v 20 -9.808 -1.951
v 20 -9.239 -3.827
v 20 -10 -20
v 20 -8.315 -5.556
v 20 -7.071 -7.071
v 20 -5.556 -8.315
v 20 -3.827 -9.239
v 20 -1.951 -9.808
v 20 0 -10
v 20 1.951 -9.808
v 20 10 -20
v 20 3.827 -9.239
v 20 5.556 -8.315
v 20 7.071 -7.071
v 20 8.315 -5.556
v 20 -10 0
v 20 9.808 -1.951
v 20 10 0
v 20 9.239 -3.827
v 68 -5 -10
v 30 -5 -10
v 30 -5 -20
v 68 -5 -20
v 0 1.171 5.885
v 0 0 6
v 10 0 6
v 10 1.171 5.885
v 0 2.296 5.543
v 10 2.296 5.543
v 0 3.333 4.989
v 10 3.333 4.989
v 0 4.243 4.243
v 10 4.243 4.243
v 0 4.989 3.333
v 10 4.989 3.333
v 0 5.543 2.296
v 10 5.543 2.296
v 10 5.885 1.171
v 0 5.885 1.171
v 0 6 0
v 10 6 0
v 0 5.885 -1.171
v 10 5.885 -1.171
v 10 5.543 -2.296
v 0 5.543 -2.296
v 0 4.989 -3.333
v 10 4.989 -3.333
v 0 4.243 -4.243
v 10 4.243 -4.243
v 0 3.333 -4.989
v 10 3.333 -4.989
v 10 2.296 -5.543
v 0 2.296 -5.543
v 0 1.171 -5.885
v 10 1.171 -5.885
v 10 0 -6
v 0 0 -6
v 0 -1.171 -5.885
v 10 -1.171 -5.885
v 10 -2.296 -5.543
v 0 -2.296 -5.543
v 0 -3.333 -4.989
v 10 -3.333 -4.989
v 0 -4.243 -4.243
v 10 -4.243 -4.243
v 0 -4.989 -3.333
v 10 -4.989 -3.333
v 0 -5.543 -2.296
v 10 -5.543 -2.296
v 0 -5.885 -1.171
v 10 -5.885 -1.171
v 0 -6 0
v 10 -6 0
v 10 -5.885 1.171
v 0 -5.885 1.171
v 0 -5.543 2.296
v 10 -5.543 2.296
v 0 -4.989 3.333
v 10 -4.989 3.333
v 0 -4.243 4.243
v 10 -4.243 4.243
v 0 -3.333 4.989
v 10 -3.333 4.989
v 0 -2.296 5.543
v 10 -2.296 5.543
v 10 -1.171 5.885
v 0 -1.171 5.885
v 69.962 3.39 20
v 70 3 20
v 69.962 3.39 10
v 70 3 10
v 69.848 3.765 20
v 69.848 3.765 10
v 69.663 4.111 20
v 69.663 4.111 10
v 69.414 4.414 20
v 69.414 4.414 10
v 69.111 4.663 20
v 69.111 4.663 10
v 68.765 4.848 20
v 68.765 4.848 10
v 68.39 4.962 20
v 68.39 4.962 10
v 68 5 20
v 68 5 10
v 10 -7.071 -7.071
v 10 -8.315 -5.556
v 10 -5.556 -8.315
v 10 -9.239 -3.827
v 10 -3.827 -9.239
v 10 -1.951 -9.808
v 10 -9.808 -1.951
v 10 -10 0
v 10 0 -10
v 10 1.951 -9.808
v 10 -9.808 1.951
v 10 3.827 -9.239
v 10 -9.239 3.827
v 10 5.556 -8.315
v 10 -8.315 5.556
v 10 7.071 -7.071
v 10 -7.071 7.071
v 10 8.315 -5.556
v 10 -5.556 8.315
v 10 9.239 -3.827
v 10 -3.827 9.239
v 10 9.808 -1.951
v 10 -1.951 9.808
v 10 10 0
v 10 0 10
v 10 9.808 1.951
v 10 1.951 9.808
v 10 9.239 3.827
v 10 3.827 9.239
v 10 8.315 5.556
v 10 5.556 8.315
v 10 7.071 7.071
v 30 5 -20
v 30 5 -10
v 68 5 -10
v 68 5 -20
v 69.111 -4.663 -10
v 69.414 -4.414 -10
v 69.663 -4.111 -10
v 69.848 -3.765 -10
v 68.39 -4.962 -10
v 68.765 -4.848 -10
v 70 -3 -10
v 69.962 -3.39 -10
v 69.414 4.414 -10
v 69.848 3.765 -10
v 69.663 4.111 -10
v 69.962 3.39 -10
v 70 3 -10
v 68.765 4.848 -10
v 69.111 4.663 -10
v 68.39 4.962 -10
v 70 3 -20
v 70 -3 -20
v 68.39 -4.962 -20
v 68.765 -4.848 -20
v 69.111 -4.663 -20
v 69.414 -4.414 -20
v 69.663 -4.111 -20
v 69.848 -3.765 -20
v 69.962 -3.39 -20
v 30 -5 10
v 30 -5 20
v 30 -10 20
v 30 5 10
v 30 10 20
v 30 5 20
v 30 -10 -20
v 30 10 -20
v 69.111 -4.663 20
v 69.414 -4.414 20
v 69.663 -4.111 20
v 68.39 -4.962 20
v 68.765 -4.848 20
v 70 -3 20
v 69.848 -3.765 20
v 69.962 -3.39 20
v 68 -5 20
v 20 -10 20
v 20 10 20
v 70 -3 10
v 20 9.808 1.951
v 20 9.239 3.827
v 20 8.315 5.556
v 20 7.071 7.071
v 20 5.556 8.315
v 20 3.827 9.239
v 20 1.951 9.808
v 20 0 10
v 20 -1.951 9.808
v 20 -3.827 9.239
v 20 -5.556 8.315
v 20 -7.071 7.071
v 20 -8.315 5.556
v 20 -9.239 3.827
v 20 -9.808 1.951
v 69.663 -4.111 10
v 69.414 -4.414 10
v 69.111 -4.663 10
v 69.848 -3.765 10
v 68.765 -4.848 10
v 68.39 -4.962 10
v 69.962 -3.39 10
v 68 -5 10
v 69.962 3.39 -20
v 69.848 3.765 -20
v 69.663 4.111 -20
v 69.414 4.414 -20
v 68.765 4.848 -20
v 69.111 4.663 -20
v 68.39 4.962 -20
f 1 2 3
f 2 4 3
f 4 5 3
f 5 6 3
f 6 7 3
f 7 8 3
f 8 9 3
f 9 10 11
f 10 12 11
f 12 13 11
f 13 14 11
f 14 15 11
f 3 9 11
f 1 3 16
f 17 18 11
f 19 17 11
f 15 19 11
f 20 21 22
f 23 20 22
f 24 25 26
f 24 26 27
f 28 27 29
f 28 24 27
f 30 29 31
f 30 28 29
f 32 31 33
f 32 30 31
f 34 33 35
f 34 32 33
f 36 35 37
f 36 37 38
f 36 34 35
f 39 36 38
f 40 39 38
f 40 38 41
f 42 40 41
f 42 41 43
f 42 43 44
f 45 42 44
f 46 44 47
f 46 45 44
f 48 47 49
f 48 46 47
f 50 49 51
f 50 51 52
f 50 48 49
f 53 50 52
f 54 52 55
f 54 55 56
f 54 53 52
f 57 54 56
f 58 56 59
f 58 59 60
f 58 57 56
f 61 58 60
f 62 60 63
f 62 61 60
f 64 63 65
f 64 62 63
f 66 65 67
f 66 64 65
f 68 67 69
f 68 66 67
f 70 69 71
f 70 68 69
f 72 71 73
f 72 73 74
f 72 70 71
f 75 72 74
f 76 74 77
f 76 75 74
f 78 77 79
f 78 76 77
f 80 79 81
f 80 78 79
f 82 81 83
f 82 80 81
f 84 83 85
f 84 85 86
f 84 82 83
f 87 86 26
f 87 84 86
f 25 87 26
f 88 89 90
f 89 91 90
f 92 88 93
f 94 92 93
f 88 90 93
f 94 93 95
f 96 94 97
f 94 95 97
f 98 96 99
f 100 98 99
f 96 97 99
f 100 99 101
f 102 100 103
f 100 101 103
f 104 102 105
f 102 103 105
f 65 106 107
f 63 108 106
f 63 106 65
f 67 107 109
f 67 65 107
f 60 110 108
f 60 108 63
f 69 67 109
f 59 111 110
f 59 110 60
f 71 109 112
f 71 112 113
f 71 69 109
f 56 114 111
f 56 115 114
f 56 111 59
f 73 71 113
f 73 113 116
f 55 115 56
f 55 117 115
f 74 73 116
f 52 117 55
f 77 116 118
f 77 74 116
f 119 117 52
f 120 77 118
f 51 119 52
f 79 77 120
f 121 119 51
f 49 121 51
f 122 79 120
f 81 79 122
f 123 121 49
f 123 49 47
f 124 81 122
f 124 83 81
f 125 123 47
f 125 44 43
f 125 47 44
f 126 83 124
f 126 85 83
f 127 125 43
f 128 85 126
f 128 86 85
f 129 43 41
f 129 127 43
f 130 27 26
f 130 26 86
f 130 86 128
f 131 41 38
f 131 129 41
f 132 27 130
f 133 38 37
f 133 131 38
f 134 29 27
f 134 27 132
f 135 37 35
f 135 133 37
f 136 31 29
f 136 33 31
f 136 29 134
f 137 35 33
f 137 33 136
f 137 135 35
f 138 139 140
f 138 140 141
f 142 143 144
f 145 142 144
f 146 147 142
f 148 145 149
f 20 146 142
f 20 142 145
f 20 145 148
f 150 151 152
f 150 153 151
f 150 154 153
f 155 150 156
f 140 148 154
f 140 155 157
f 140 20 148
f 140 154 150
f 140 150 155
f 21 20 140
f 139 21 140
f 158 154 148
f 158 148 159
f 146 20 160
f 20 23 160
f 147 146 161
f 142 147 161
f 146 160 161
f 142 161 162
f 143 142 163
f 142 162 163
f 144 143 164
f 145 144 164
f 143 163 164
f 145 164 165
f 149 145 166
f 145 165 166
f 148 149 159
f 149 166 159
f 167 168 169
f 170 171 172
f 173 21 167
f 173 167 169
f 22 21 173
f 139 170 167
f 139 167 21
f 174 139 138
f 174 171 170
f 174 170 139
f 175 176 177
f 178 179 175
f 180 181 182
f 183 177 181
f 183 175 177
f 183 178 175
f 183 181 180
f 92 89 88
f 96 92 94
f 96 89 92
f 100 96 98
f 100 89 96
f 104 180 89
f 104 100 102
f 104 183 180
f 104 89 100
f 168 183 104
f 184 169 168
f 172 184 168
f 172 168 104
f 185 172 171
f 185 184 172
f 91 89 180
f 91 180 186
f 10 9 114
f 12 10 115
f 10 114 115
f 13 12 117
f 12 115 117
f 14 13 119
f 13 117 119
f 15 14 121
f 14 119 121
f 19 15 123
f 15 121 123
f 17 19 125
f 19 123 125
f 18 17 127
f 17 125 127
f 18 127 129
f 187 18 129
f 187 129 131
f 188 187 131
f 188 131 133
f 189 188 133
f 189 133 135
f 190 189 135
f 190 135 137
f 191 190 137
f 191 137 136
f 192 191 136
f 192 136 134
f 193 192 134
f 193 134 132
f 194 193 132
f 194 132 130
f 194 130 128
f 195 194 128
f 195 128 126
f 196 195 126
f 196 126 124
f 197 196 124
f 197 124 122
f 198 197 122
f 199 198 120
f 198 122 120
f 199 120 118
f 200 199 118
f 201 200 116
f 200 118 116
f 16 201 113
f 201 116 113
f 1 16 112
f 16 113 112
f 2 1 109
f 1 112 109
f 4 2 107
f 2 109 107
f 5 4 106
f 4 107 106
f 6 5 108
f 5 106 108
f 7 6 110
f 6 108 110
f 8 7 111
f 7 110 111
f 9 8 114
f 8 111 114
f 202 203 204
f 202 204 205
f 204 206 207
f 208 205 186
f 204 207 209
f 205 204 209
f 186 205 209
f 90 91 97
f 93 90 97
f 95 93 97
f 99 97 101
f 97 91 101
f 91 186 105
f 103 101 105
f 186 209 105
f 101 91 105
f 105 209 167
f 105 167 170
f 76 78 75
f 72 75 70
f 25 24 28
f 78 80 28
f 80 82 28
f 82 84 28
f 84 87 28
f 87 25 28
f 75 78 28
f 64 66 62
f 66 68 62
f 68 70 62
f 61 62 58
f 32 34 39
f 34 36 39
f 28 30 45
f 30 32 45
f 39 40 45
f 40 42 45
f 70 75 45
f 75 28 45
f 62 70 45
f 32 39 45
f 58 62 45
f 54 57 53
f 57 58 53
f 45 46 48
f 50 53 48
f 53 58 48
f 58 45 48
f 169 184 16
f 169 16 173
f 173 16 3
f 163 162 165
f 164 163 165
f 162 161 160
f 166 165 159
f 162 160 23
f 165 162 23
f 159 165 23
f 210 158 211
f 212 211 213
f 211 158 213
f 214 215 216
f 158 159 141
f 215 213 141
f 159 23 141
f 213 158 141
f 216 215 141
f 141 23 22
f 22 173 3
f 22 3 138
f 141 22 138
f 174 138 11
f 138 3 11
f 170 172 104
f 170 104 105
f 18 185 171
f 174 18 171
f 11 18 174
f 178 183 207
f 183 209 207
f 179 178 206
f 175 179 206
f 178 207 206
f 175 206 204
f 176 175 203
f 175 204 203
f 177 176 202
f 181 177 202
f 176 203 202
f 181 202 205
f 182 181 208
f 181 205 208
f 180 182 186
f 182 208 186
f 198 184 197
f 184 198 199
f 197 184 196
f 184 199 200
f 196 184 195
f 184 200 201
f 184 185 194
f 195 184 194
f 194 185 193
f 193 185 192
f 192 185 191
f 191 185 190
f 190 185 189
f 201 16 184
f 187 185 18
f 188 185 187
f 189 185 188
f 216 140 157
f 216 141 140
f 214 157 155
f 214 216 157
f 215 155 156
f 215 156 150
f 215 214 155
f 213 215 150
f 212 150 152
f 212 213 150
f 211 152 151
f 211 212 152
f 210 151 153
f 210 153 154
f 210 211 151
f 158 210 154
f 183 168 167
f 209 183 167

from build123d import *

# Parameters (mm, degrees)
SKETCH1_R           = 10
BOSS_EXTRUDE1_DEPTH = 20
SKETCH2_OUTSIDE_W   = 28.928
SKETCH2_OUTSIDE_H   = 28.928
SKETCH2_OUTSIDE_R   = 6
CUT_EXTRUDE1_DEPTH  = 10
SKETCH4_W           = 40
SKETCH4_H           = 20
BOSS_EXTRUDE2_DEPTH = 10
SKETCH6_W           = 10
SKETCH6_H           = 10
BOSS_EXTRUDE3_DEPTH = 40
SKETCH7_W           = 10
SKETCH7_H           = 10
BOSS_EXTRUDE4_DEPTH = 40
FILLET1_R           = 2


with BuildPart() as part:
    # Sketch1 → Boss-Extrude1 (new body)
    with BuildSketch(Plane(origin=(0, 0, 0), x_dir=(0, 0, -1), z_dir=(1, 0, 0))):
        Circle(SKETCH1_R)
    extrude(amount=BOSS_EXTRUDE1_DEPTH)

    # Sketch2 outside → Cut-Extrude1 (cut)
    with BuildSketch(Plane.ZY):
        Rectangle(SKETCH2_OUTSIDE_W, SKETCH2_OUTSIDE_H)
        Circle(SKETCH2_OUTSIDE_R, mode=Mode.SUBTRACT)
    extrude(amount=-CUT_EXTRUDE1_DEPTH, mode=Mode.SUBTRACT)

    # Sketch4 → Boss-Extrude2 (add)
    with BuildSketch(Plane(origin=(20, 0, 0), x_dir=(0, 0, -1), z_dir=(1, 0, 0))):
        Rectangle(SKETCH4_W, SKETCH4_H)
    extrude(amount=BOSS_EXTRUDE2_DEPTH)

    # Sketch6 → Boss-Extrude3 (add)
    with BuildSketch(Plane(origin=(30, 0, 0), x_dir=(0, 0, -1), z_dir=(1, 0, 0))):
        with Locations((-15, 0)):
            Rectangle(SKETCH6_W, SKETCH6_H)
    extrude(amount=BOSS_EXTRUDE3_DEPTH)

    # Sketch7 → Boss-Extrude4 (add)
    with BuildSketch(Plane(origin=(30, 0, 0), x_dir=(0, 0, -1), z_dir=(1, 0, 0))):
        with Locations((15, 0)):
            Rectangle(SKETCH7_W, SKETCH7_H)
    extrude(amount=BOSS_EXTRUDE4_DEPTH)

    # Fillet1
    fillet1_edges = [part.edges().sort_by_distance(p)[0] for p in [
        (70, -5, -15),
        (70, 5, -15),
        (70, -5, 15),
        (70, 5, 15),
    ]]
    fillet(fillet1_edges, radius=FILLET1_R)


solid = part.part
